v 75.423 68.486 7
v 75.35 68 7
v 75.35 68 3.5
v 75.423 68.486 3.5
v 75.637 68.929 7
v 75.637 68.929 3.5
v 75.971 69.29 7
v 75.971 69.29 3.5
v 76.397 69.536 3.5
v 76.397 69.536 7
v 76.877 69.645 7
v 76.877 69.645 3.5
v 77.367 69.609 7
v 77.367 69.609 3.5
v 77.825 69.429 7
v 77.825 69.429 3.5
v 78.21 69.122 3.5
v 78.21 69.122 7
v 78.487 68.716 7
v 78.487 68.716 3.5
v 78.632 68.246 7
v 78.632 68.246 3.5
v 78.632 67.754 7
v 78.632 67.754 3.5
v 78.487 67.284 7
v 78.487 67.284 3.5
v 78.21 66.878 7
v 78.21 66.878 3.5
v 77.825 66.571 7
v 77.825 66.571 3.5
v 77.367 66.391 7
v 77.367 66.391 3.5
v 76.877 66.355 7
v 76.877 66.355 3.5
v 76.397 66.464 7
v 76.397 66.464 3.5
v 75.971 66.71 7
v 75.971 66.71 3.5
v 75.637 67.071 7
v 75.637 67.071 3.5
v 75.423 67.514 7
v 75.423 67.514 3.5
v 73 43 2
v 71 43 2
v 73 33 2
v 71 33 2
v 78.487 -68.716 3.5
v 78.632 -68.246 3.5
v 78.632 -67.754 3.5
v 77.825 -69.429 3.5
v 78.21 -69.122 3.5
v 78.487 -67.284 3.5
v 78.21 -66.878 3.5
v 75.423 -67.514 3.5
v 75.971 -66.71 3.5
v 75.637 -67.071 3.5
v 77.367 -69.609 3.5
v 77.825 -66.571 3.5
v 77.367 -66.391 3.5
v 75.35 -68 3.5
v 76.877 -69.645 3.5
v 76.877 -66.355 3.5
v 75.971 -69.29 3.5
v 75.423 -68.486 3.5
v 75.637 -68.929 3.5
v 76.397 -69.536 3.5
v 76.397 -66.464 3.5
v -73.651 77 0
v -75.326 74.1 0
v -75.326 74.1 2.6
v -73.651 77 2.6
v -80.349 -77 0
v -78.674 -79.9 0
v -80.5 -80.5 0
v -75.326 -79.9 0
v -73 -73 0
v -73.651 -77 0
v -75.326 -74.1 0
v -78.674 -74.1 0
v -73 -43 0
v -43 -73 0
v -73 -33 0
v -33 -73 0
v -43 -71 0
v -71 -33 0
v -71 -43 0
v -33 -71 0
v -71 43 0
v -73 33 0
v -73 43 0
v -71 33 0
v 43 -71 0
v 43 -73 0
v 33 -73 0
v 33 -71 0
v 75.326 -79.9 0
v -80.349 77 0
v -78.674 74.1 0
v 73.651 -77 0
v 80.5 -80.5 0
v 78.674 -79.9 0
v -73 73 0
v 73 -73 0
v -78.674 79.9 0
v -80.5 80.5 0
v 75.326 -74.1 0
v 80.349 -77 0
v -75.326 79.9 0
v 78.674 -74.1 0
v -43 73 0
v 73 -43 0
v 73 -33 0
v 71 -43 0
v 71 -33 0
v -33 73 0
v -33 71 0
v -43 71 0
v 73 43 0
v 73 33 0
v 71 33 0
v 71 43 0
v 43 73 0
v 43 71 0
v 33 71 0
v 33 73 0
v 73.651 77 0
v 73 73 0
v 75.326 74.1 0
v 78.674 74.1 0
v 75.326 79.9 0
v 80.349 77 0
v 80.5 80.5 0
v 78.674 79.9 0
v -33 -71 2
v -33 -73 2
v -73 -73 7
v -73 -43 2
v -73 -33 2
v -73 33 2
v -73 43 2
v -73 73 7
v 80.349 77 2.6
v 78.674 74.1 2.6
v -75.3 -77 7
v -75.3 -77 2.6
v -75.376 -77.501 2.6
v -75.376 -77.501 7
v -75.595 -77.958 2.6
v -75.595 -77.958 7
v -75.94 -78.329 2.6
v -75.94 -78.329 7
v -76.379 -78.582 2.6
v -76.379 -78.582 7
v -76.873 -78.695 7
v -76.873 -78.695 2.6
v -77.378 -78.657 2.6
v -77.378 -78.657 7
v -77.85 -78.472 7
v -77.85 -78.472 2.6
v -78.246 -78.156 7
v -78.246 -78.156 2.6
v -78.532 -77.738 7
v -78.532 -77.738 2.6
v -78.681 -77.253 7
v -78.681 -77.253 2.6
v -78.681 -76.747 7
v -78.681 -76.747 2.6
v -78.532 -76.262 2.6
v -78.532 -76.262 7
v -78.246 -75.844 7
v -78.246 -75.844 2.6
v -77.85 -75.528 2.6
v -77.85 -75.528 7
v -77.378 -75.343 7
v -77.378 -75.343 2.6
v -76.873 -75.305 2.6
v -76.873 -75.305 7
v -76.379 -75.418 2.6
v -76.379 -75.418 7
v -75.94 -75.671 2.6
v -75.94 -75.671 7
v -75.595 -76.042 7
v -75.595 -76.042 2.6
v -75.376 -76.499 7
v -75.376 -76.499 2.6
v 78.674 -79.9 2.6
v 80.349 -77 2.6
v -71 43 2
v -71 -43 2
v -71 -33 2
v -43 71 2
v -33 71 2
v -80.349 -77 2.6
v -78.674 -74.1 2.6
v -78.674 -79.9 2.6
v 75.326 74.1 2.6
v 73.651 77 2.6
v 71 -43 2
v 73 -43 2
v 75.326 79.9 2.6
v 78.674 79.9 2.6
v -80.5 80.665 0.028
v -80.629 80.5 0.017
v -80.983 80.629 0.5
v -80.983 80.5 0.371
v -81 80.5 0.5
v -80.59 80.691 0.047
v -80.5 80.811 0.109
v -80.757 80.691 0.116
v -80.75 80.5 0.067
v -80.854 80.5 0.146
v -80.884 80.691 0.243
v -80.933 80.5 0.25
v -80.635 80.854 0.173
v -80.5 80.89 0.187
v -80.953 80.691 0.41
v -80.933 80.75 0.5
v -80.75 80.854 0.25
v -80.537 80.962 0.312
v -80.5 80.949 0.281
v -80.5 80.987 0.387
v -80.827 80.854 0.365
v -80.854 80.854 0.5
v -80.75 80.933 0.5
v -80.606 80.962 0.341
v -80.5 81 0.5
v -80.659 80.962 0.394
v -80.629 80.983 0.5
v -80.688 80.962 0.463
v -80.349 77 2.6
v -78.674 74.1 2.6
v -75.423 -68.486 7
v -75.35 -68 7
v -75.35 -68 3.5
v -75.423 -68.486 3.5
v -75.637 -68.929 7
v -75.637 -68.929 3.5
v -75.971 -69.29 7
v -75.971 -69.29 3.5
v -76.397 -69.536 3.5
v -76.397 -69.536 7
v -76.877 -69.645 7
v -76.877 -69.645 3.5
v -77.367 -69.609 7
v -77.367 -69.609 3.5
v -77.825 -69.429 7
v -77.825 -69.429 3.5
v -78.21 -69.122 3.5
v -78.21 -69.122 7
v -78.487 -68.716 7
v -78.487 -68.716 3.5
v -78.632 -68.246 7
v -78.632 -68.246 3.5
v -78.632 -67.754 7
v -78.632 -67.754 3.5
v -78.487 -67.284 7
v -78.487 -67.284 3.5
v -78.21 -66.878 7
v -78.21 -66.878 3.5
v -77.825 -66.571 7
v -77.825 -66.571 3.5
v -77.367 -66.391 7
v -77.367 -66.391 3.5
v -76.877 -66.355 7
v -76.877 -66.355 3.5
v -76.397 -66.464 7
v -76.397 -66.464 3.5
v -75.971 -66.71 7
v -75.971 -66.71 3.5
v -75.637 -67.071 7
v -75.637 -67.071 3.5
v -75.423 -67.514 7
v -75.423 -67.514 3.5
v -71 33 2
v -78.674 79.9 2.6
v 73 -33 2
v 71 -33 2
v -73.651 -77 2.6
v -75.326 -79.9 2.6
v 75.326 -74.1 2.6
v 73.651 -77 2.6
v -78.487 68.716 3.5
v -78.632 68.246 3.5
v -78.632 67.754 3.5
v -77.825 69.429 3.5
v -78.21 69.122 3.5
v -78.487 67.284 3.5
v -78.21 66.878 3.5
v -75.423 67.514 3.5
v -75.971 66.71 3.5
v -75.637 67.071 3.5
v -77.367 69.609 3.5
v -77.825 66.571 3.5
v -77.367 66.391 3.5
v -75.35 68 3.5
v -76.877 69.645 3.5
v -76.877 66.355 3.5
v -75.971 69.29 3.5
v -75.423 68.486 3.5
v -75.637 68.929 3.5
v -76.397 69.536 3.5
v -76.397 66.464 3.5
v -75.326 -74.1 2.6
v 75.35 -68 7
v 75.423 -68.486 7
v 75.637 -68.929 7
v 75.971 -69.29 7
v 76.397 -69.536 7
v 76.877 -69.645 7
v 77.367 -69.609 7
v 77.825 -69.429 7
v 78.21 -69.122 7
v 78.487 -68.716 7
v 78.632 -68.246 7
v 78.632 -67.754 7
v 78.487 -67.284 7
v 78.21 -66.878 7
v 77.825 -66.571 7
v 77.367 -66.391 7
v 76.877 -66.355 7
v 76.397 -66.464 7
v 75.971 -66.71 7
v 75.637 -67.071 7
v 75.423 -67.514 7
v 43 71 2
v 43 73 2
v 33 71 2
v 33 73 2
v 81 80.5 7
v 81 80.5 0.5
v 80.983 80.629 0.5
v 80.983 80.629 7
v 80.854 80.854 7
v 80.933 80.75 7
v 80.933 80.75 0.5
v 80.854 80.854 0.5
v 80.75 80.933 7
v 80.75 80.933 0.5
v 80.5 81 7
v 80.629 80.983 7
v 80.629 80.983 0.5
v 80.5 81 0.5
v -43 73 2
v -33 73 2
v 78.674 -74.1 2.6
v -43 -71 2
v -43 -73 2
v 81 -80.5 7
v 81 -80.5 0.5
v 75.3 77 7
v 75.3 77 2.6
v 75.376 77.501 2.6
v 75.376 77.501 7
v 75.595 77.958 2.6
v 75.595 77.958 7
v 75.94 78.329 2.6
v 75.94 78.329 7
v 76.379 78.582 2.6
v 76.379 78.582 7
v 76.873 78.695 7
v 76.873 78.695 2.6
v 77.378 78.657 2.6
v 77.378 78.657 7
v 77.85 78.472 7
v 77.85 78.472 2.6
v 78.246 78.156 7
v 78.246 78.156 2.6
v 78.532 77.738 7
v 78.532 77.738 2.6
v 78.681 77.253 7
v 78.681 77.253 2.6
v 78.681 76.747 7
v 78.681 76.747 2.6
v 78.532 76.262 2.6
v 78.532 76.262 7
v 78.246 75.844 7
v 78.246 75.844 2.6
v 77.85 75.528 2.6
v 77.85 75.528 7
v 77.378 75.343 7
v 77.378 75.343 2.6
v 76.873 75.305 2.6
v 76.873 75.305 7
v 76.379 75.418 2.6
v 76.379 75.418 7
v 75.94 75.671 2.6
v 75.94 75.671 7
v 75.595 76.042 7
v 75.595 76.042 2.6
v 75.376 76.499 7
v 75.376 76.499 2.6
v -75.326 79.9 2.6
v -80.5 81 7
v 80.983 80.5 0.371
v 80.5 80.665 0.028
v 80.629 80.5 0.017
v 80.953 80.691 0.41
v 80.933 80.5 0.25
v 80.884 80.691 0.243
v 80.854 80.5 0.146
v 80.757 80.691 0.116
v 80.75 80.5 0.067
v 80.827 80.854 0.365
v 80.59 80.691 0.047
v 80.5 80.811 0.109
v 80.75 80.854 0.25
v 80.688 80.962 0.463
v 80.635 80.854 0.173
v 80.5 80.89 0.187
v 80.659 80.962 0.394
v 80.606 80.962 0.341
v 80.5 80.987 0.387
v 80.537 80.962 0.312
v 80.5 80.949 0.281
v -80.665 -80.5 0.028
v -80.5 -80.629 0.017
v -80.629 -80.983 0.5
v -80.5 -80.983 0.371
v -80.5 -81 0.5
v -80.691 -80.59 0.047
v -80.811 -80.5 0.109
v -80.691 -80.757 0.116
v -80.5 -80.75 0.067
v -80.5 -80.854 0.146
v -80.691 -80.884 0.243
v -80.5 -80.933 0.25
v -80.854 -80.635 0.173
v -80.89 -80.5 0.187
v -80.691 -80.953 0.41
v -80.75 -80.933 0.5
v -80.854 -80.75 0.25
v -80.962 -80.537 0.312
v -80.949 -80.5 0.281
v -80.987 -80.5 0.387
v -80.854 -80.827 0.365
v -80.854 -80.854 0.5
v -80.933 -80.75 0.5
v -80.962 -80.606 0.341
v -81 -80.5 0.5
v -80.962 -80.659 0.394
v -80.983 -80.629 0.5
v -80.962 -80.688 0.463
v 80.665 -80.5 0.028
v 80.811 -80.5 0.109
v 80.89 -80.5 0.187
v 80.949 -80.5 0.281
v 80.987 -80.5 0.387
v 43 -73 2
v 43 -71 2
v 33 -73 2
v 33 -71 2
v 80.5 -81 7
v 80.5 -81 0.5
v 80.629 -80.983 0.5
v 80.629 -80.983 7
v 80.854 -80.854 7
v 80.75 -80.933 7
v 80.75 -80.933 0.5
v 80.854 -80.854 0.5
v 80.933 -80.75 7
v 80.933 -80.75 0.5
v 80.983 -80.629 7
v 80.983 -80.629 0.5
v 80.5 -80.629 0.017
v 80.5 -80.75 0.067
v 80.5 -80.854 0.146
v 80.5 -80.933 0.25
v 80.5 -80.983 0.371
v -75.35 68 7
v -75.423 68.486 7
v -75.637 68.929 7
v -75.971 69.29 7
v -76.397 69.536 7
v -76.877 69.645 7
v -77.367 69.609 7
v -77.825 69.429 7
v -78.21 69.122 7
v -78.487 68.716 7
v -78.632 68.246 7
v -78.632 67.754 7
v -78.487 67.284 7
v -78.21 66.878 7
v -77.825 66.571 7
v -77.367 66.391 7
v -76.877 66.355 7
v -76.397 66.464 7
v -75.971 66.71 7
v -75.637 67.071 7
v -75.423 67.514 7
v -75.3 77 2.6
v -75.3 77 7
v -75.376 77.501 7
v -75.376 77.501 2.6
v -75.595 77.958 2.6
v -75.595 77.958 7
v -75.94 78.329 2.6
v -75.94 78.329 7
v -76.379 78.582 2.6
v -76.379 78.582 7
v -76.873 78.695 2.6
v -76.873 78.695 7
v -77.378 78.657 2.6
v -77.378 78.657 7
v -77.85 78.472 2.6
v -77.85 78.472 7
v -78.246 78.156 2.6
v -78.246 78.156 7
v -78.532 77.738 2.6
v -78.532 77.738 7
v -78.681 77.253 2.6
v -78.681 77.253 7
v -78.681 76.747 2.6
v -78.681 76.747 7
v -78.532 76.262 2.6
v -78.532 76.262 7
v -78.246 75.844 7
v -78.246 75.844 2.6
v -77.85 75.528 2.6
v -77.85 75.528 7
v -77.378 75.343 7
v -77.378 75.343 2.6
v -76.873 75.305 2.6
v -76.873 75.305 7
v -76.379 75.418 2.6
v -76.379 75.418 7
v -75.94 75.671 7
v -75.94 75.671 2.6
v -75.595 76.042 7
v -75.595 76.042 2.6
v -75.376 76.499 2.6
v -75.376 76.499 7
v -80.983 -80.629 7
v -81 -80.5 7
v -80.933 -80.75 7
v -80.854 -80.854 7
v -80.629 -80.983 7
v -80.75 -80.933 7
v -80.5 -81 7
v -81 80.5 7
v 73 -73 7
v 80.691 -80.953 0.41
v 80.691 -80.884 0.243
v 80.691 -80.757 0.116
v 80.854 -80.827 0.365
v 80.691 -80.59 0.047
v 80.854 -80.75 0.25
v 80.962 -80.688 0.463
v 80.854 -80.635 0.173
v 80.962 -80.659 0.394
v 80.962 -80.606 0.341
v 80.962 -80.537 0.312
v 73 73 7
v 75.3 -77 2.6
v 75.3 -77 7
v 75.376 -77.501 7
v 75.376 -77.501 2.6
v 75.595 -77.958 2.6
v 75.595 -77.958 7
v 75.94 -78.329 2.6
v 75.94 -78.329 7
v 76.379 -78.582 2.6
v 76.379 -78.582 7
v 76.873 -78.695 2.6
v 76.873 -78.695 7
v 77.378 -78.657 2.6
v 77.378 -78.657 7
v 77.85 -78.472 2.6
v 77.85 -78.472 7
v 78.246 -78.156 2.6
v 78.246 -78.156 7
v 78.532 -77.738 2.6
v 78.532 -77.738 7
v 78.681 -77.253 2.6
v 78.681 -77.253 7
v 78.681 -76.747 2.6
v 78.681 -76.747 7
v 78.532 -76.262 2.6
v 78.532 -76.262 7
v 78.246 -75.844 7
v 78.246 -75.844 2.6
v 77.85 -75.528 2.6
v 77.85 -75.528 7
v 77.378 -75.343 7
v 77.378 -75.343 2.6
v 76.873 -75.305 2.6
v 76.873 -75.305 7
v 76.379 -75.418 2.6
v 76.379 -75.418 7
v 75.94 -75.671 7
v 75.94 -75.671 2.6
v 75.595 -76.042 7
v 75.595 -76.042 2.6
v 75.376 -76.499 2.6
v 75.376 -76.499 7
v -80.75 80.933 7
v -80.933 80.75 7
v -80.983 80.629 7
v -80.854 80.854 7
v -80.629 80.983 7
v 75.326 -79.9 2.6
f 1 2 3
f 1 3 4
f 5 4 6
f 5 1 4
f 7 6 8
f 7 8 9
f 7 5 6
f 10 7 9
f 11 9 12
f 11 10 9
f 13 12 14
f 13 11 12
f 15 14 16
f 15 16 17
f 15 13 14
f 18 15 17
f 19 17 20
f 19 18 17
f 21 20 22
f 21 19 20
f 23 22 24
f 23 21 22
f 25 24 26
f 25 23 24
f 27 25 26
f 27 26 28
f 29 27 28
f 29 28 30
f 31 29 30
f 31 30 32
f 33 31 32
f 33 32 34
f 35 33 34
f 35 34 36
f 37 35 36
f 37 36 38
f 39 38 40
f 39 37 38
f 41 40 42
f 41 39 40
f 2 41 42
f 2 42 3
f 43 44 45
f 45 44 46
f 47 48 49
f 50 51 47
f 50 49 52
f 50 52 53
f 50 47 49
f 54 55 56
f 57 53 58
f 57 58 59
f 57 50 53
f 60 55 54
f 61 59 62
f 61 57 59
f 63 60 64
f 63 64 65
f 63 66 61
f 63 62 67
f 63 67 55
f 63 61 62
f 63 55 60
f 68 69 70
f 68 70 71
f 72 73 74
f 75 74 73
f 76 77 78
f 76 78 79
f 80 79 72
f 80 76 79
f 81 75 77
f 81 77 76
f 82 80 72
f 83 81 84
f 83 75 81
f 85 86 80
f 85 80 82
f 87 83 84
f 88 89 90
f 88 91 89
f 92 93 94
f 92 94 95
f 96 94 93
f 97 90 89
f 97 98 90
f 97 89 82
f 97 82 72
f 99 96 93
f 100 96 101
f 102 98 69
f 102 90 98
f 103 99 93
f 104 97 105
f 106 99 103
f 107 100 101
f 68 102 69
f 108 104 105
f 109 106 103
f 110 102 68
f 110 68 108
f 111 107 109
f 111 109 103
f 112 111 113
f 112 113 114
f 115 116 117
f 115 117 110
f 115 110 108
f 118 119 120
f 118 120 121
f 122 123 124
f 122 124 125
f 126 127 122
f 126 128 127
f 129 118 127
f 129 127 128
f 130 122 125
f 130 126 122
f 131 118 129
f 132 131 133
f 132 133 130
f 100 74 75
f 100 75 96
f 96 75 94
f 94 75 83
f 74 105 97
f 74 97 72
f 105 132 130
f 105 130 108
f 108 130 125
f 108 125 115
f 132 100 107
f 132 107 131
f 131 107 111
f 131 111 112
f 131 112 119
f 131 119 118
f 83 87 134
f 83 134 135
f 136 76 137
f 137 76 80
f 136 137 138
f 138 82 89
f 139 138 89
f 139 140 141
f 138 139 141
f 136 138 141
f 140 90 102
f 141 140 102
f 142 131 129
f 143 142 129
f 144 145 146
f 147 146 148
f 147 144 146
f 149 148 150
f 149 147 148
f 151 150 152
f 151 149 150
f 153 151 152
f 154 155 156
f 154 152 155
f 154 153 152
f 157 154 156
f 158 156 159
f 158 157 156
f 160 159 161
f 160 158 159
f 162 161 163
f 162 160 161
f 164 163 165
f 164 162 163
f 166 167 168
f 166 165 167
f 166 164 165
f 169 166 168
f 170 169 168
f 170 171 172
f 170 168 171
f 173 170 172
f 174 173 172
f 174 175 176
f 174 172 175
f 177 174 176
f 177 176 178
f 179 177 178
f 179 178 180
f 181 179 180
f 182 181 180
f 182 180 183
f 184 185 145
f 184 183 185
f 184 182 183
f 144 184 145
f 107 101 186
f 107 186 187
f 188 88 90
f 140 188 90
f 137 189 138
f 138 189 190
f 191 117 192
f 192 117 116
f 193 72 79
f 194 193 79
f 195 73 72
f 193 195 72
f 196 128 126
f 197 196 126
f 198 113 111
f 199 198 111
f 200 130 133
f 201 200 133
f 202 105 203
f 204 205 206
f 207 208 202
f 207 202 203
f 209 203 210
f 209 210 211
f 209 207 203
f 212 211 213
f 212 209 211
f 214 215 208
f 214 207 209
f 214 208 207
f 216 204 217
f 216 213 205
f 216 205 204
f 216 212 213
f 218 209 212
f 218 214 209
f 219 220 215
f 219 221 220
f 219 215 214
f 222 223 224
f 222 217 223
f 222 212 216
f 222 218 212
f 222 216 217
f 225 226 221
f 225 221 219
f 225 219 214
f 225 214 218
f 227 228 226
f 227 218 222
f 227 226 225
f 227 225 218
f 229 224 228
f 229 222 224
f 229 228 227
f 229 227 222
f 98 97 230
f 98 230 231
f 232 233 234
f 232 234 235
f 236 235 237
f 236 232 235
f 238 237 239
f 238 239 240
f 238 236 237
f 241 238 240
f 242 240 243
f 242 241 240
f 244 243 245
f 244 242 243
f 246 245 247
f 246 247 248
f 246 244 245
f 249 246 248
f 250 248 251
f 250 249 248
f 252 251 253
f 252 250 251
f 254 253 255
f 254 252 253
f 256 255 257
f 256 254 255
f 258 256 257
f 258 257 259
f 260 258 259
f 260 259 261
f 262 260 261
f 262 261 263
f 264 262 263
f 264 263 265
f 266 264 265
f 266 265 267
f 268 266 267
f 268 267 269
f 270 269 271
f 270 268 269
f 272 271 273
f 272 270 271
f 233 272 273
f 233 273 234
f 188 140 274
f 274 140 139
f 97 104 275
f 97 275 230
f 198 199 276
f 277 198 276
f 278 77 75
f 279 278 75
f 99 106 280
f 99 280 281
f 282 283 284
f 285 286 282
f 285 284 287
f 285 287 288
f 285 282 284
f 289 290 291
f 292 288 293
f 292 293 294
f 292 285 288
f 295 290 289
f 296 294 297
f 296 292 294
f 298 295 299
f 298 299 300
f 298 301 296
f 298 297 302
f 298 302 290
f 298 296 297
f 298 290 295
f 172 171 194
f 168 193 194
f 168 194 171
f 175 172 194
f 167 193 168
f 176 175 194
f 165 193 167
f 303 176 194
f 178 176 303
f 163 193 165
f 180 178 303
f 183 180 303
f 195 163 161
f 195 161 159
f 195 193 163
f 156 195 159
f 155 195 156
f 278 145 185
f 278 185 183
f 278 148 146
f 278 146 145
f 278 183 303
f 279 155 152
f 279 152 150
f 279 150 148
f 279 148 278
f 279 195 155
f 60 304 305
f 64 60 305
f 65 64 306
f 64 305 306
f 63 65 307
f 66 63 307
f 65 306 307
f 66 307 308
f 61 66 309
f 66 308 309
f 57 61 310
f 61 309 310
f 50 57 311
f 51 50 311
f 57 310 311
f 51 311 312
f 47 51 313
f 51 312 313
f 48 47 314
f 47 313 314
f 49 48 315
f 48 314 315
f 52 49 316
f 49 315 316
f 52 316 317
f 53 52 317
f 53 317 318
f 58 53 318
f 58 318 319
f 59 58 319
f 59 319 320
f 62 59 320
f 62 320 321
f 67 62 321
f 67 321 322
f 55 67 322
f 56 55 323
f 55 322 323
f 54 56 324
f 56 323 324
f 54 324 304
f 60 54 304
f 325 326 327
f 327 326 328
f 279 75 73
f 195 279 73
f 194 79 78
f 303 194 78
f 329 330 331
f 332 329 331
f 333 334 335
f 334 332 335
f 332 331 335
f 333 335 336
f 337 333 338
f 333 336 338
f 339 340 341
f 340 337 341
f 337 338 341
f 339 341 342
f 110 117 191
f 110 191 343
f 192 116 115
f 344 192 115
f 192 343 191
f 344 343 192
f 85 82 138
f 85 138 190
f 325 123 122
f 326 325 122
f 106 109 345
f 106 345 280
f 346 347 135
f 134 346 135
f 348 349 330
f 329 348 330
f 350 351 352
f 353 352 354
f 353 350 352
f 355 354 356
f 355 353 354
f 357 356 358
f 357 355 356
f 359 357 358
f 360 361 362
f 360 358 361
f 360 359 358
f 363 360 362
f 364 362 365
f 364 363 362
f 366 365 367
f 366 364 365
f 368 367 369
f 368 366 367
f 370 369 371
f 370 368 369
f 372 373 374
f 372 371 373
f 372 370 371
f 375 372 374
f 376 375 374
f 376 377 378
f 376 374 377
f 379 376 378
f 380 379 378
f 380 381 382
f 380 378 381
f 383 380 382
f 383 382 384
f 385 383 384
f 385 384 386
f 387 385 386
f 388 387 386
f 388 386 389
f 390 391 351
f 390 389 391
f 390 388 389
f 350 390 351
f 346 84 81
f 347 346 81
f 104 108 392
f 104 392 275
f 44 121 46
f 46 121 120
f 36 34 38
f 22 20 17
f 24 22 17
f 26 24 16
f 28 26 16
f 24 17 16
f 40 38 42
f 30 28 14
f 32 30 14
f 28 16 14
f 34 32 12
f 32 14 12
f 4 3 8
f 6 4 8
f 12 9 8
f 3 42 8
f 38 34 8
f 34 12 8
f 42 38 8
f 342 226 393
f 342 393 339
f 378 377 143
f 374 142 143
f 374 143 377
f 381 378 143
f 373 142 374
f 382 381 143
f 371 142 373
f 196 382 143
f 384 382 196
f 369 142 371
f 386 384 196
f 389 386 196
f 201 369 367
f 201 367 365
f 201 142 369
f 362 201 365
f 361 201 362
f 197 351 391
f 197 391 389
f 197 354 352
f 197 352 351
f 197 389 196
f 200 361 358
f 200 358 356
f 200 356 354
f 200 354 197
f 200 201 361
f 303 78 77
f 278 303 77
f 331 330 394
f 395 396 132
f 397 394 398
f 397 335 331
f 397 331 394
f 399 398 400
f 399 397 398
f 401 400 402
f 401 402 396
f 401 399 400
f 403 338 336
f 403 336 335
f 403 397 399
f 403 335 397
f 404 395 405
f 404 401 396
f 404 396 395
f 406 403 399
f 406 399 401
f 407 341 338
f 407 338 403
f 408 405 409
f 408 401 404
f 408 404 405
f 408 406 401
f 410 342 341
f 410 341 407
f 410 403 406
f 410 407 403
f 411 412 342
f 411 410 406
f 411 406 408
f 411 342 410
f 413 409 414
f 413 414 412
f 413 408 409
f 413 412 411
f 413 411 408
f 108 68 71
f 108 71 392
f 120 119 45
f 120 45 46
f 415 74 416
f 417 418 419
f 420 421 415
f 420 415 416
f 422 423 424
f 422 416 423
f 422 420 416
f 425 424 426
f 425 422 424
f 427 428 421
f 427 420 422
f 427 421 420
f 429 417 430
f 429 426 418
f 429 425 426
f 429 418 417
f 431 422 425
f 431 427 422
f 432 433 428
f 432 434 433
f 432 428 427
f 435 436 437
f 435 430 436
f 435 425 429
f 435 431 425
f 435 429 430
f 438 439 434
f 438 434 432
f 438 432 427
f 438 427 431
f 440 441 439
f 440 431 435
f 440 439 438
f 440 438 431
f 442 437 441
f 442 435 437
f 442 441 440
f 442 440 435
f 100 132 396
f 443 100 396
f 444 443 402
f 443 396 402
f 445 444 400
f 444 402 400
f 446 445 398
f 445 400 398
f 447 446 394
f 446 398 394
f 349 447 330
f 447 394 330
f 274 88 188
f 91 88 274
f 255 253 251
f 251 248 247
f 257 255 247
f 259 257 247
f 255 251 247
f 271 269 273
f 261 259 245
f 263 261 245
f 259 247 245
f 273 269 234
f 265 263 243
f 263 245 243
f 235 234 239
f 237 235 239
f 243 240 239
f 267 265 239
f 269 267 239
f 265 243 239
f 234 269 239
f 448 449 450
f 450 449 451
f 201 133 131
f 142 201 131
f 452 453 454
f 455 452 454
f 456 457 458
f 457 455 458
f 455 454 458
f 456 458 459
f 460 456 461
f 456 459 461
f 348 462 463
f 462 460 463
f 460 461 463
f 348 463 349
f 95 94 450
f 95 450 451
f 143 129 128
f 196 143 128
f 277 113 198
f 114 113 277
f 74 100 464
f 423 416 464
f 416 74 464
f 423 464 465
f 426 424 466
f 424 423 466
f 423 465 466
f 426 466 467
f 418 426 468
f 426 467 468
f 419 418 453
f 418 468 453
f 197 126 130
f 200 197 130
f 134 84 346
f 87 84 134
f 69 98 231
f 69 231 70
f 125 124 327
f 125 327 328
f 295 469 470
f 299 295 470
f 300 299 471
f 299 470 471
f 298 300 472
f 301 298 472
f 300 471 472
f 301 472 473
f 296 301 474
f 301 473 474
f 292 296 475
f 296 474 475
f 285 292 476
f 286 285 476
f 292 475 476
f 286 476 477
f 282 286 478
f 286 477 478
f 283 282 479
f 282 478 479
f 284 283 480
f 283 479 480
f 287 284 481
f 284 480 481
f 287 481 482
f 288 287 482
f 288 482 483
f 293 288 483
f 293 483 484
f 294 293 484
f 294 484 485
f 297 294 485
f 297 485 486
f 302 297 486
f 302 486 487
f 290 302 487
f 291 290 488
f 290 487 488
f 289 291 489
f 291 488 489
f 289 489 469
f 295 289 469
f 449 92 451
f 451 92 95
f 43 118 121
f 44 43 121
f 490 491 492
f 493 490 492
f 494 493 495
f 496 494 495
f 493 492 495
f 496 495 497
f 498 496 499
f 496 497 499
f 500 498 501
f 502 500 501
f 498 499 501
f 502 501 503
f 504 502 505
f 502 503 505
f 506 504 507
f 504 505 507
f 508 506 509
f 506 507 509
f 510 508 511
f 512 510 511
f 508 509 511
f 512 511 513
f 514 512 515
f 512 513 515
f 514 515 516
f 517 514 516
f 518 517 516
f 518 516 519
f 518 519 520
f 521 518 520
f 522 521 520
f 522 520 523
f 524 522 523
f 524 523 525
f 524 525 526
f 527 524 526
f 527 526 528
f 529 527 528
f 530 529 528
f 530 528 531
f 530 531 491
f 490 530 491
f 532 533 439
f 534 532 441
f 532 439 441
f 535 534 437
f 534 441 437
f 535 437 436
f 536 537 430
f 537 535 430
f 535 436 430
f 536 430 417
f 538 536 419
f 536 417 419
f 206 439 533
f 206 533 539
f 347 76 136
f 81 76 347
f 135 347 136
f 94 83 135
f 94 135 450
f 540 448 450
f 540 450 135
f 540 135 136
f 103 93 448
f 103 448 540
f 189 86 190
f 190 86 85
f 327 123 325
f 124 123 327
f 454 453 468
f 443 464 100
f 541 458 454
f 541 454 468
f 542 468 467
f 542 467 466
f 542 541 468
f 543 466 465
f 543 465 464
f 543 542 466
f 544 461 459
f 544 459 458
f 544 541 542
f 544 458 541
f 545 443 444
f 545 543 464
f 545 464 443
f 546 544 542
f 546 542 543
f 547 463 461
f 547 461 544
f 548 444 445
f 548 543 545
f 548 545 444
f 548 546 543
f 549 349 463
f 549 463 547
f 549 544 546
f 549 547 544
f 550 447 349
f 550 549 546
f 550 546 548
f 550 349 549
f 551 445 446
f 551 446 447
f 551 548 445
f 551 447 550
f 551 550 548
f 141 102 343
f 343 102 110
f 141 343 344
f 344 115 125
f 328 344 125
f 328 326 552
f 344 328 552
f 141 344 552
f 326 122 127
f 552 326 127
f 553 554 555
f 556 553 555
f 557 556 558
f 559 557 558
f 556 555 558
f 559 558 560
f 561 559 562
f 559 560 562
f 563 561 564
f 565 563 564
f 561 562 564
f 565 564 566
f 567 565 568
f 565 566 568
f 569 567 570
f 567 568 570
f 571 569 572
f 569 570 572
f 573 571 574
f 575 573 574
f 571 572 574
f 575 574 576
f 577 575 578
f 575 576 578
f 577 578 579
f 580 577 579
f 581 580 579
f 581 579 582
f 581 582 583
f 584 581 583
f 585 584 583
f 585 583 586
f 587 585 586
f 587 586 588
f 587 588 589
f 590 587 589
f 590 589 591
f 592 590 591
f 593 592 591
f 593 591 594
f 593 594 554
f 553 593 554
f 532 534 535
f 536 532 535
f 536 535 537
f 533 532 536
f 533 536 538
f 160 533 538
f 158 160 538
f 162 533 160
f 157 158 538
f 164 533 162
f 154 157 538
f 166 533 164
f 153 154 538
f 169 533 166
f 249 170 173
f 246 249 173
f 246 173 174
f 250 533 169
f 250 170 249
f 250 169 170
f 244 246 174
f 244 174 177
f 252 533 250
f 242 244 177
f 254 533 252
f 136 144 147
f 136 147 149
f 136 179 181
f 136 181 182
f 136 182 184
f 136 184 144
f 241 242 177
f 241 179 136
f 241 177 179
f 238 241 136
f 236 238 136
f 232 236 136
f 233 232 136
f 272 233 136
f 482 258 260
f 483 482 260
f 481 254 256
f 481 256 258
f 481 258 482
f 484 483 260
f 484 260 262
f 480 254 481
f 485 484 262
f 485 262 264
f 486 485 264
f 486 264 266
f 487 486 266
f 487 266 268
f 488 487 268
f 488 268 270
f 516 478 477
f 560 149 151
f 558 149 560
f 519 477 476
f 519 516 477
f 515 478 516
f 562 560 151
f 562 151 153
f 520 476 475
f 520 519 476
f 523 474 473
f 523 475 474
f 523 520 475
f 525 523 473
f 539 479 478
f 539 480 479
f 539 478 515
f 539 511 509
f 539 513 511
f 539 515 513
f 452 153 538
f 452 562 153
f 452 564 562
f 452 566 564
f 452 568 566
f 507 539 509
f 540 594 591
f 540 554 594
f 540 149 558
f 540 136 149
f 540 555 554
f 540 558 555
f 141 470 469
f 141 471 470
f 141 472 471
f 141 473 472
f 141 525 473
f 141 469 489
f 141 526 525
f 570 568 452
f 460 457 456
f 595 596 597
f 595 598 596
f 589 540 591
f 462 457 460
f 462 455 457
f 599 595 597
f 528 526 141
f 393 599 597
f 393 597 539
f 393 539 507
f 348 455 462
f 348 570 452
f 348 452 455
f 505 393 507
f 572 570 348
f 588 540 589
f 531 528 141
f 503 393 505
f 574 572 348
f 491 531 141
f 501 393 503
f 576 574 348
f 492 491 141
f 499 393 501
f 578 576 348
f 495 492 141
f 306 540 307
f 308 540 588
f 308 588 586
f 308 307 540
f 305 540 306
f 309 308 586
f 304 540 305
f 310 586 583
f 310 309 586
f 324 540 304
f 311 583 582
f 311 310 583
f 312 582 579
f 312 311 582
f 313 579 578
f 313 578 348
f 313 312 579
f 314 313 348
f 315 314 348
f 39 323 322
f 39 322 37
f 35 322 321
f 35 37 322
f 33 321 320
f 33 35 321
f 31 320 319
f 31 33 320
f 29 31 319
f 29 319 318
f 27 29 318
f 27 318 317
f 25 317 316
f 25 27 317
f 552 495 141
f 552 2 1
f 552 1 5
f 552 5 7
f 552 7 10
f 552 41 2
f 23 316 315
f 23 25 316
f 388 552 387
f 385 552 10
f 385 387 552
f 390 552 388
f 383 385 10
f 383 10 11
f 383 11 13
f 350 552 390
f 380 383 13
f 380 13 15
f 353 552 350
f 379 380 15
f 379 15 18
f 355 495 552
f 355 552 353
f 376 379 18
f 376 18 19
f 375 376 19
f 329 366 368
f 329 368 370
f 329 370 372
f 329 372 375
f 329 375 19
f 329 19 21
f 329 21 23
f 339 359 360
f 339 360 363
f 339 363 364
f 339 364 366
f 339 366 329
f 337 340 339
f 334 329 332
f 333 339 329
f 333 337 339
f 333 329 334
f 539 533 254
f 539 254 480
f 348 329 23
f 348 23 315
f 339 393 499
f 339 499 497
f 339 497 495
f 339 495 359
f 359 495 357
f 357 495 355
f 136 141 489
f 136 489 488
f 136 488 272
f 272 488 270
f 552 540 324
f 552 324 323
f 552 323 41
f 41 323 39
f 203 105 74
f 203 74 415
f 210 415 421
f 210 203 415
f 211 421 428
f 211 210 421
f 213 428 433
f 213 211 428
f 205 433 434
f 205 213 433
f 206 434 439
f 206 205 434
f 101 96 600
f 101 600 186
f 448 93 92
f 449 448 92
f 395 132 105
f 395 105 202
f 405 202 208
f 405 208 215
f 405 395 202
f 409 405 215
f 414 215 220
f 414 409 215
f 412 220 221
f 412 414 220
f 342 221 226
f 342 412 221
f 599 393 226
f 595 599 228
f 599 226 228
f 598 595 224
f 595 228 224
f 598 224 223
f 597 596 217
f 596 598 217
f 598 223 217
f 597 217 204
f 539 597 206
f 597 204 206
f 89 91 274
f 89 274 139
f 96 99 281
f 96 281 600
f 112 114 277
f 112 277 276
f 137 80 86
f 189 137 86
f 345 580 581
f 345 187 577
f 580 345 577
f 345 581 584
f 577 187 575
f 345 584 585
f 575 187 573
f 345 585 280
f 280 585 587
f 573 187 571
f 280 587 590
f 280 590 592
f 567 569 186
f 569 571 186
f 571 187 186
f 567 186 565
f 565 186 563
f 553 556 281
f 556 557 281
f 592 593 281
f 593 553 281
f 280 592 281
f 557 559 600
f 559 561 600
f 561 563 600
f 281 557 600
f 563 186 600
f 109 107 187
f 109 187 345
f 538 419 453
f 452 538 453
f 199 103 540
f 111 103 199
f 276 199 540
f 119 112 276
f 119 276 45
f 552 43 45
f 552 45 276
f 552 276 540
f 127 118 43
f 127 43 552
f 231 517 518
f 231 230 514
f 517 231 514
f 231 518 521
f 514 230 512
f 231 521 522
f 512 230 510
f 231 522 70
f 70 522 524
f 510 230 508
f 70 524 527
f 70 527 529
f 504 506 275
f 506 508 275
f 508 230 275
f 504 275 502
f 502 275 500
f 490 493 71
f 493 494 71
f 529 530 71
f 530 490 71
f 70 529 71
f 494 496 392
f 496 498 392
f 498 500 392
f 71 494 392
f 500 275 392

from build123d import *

# Parameters (mm, degrees)
SKETCH_1_W                                   = 162
SKETCH_1_H                                   = 162
SKETCH_1_W_2                                 = 146
SKETCH_1_H_2                                 = 146
EXTRUDE_375_DEPTH                            = 7
SKETCH_2_W                                   = 10
SKETCH_2_H                                   = 3
EXTRUDE_670_DEPTH                            = 2
PATTERN_CIRCULAR_761_COUNT                   = 4
PATTERN_CIRCULAR_761_COPY_1_SKETCH_W         = 10
PATTERN_CIRCULAR_761_COPY_1_SKETCH_H         = 3
PATTERN_CIRCULAR_761_COPY_1_DEPTH            = 2
PATTERN_CIRCULAR_761_COPY_2_SKETCH_W         = 10
PATTERN_CIRCULAR_761_COPY_2_SKETCH_H         = 3
PATTERN_CIRCULAR_761_COPY_2_DEPTH            = 2
PATTERN_CIRCULAR_761_COPY_3_SKETCH_W         = 10
PATTERN_CIRCULAR_761_COPY_3_SKETCH_H         = 3
PATTERN_CIRCULAR_761_COPY_3_DEPTH            = 2
SKETCH_3_R                                   = 1.7
CUT_EXTRUDE_1047_DEPTH                       = 115.764977236
MIRROR_1214_COPY_1_SKETCH_R                  = 1.7
MIRROR_1214_COPY_1_DEPTH                     = 115.764977236
SKETCH_4_R                                   = 1.65
CUT_EXTRUDE_1505_DEPTH                       = 3.5
MIRROR_1637_COPY_1_SKETCH_R                  = 1.65
MIRROR_1637_COPY_1_DEPTH                     = 3.5
CUT_EXTRUDE_2611_DEPTH                       = 2.6
MIRROR_2701_AT_THE_SECOND_PLANE_COPY_1_DEPTH = 2.6
FILLET_1_R                                   = 0.5
FILLET_2_R                                   = 0.5


with BuildPart() as part:
    # Эскиз1 → Extrude 375 (new body)
    with BuildSketch(Plane.XY):
        Rectangle(SKETCH_1_W, SKETCH_1_H)
        Rectangle(SKETCH_1_W_2, SKETCH_1_H_2, mode=Mode.SUBTRACT)
    extrude(amount=EXTRUDE_375_DEPTH)

    # Эскиз2 → Extrude 670 (add)
    with BuildSketch(Plane(origin=(0, 0, 0), x_dir=(-1, 0, 0), z_dir=(0, 0, -1))):
        with Locations((-38, 72.5)):
            Rectangle(SKETCH_2_W, SKETCH_2_H)
    extrude_670 = extrude(amount=-EXTRUDE_670_DEPTH)

    # Mirror 726: Extrude 670 across plane
    add(extrude_670.mirror(Plane(origin=(0, 0, 0), x_dir=(0, 0, 1), z_dir=(1, 0, 0))))

    # Pattern Circular 761: Extrude 670 ×4 about axis
    pattern_circular_761_axis = Axis((0, 0, 0), (0, 0, 1))
    for i in range(1, PATTERN_CIRCULAR_761_COUNT):
        add(extrude_670.rotate(pattern_circular_761_axis, i * 360 / PATTERN_CIRCULAR_761_COUNT))

    # Pattern Circular 761 copy 1 sketch → Pattern Circular 761 copy 1 (add)
    with BuildSketch(Plane.YX):
        with Locations((-38, -72.5)):
            Rectangle(PATTERN_CIRCULAR_761_COPY_1_SKETCH_W, PATTERN_CIRCULAR_761_COPY_1_SKETCH_H)
    extrude(amount=-PATTERN_CIRCULAR_761_COPY_1_DEPTH)

    # Pattern Circular 761 copy 2 sketch → Pattern Circular 761 copy 2 (add)
    with BuildSketch(Plane(origin=(0, 0, 0), x_dir=(-1, 0, 0), z_dir=(0, 0, -1))):
        with Locations((-38, -72.5)):
            Rectangle(PATTERN_CIRCULAR_761_COPY_2_SKETCH_W, PATTERN_CIRCULAR_761_COPY_2_SKETCH_H)
    extrude(amount=-PATTERN_CIRCULAR_761_COPY_2_DEPTH)

    # Pattern Circular 761 copy 3 sketch → Pattern Circular 761 copy 3 (add)
    with BuildSketch(Plane(origin=(0, 0, 0), x_dir=(0, -1, 0), z_dir=(0, 0, -1))):
        with Locations((-38, -72.5)):
            Rectangle(PATTERN_CIRCULAR_761_COPY_3_SKETCH_W, PATTERN_CIRCULAR_761_COPY_3_SKETCH_H)
    extrude(amount=-PATTERN_CIRCULAR_761_COPY_3_DEPTH)

    # Эскиз3 → Cut-Extrude 1047 (cut, through all)
    with BuildSketch(Plane.XY.offset(7)):
        with Locations((-77, 77)):
            Circle(SKETCH_3_R)
    cut_extrude_1047 = extrude(amount=-CUT_EXTRUDE_1047_DEPTH, mode=Mode.SUBTRACT)

    # Mirror 1158: Cut-Extrude 1047 across plane
    add(cut_extrude_1047.mirror(Plane(origin=(0, 0, 0), x_dir=(0, 0, 1), z_dir=(1, 0, 0))), mode=Mode.SUBTRACT)

    # Mirror 1214: Cut-Extrude 1047 across plane
    add(cut_extrude_1047.mirror(Plane.ZX), mode=Mode.SUBTRACT)

    # Mirror 1214 copy 1 sketch → Mirror 1214 copy 1 (cut, through all)
    with BuildSketch(Plane(origin=(0, 0, 7), x_dir=(-1, 0, 0), z_dir=(0, 0, 1))):
        with Locations((-77, 77)):
            Circle(MIRROR_1214_COPY_1_SKETCH_R)
    extrude(amount=-MIRROR_1214_COPY_1_DEPTH, mode=Mode.SUBTRACT)

    # Эскиз4 → Cut-Extrude 1505 (cut)
    with BuildSketch(Plane.XY.offset(7)):
        with Locations((-77, 68)):
            Circle(SKETCH_4_R)
    cut_extrude_1505 = extrude(amount=-CUT_EXTRUDE_1505_DEPTH, mode=Mode.SUBTRACT)

    # Mirror 1581: Cut-Extrude 1505 across plane
    add(cut_extrude_1505.mirror(Plane(origin=(0, 0, 0), x_dir=(0, 0, 1), z_dir=(1, 0, 0))), mode=Mode.SUBTRACT)

    # Mirror 1637: Cut-Extrude 1505 across plane
    add(cut_extrude_1505.mirror(Plane.ZX), mode=Mode.SUBTRACT)

    # Mirror 1637 copy 1 sketch → Mirror 1637 copy 1 (cut)
    with BuildSketch(Plane(origin=(0, 0, 7), x_dir=(-1, 0, 0), z_dir=(0, 0, 1))):
        with Locations((-77, 68)):
            Circle(MIRROR_1637_COPY_1_SKETCH_R)
    extrude(amount=-MIRROR_1637_COPY_1_DEPTH, mode=Mode.SUBTRACT)

    # Эскиз5 → Cut-Extrude 2611 (cut)
    with BuildSketch(Plane(origin=(0, 0, 0), x_dir=(-1, 0, 0), z_dir=(0, 0, -1))):
        Polygon((-73.651368439, 77), (-75.325684219, 79.9), (-78.674315781, 79.9), (-80.348631561, 77), (-78.674315781, 74.1), (-75.325684219, 74.1), align=None)
    cut_extrude_2611 = extrude(amount=-CUT_EXTRUDE_2611_DEPTH, mode=Mode.SUBTRACT)

    # Mirror 2701: Cut-Extrude 2611 across plane
    add(cut_extrude_2611.mirror(Plane(origin=(0, 0, 0), x_dir=(0, 0, 1), z_dir=(1, 0, 0))), mode=Mode.SUBTRACT)

    # Mirror 2701 at the second plane: Cut-Extrude 2611 across plane
    add(cut_extrude_2611.mirror(Plane.ZX), mode=Mode.SUBTRACT)

    # Mirror 2701 at the second plane copy 1 s → Mirror 2701 at the second plane copy 1 (cut)
    with BuildSketch(Plane(origin=(0, 0, 0), x_dir=(1, 0, 0), z_dir=(0, 0, -1))):
        Polygon((-73.651368439, 77), (-75.325684219, 79.9), (-78.674315781, 79.9), (-80.348631561, 77), (-78.674315781, 74.1), (-75.325684219, 74.1), align=None)
    extrude(amount=-MIRROR_2701_AT_THE_SECOND_PLANE_COPY_1_DEPTH, mode=Mode.SUBTRACT)

    # Скругление1
    fillet_1_edges = [part.edges().sort_by_distance(p)[0] for p in [
        (0, -81, 0),
        (-81, 0, 0),
        (0, 81, 0),
        (81, 0, 0),
    ]]
    fillet(fillet_1_edges, radius=FILLET_1_R)

    # Скругление2
    # the kernel refuses this fillet: 0.5 mm, written as the material it takes off along each edge
    with BuildSketch(Plane(origin=(-80.5, 80.5, 0.5), x_dir=(-1, 0, 0), z_dir=(0, 1, 0))) as fillet_2_piece_1_section:
        Polygon((0, 0), (FILLET_2_R, 0), (FILLET_2_R, -FILLET_2_R), (0, -FILLET_2_R), align=None)
    fillet_2_piece_1 = extrude(amount=FILLET_2_R, mode=Mode.PRIVATE)
    fillet_2_piece_1 = fillet_2_piece_1 - Plane(origin=(-80.5, 80.5, 0.5), x_dir=(0.7071067811865475, 0, 0.7071067811865475), z_dir=(0, 1, 0)) * Sphere(FILLET_2_R, mode=Mode.PRIVATE)
    add(fillet_2_piece_1, mode=Mode.SUBTRACT)
    with BuildSketch(Plane(origin=(80.5, 80.5, 0.5), x_dir=(1, 0, 0), z_dir=(0, 1, 0))) as fillet_2_piece_2_section:
        Polygon((0, 0), (FILLET_2_R, 0), (FILLET_2_R, FILLET_2_R), (0, FILLET_2_R), align=None)
    fillet_2_piece_2 = extrude(amount=FILLET_2_R, mode=Mode.PRIVATE)
    fillet_2_piece_2 = fillet_2_piece_2 - Plane(origin=(80.5, 80.5, 0.5), x_dir=(-0.7071067811865475, 0, 0.7071067811865475), z_dir=(0, 1, 0)) * Sphere(FILLET_2_R, mode=Mode.PRIVATE)
    add(fillet_2_piece_2, mode=Mode.SUBTRACT)
    with BuildSketch(Plane(origin=(-80.5, -80.5, 0.5), x_dir=(0, -1, 0), z_dir=(-1, 0, 0))) as fillet_2_piece_3_section:
        Polygon((0, 0), (FILLET_2_R, 0), (FILLET_2_R, -FILLET_2_R), (0, -FILLET_2_R), align=None)
    fillet_2_piece_3 = extrude(amount=FILLET_2_R, mode=Mode.PRIVATE)
    fillet_2_piece_3 = fillet_2_piece_3 - Plane(origin=(-80.5, -80.5, 0.5), x_dir=(0, 0.7071067811865475, 0.7071067811865475), z_dir=(-1, 0, 0)) * Sphere(FILLET_2_R, mode=Mode.PRIVATE)
    add(fillet_2_piece_3, mode=Mode.SUBTRACT)
    with BuildSketch(Plane(origin=(80.5, -80.5, 0.5), x_dir=(0, -1, 0), z_dir=(1, 0, 0))) as fillet_2_piece_4_section:
        Polygon((0, 0), (FILLET_2_R, 0), (FILLET_2_R, FILLET_2_R), (0, FILLET_2_R), align=None)
    fillet_2_piece_4 = extrude(amount=FILLET_2_R, mode=Mode.PRIVATE)
    fillet_2_piece_4 = fillet_2_piece_4 - Plane(origin=(80.5, -80.5, 0.5), x_dir=(0, 0.7071067811865475, 0.7071067811865475), z_dir=(1, 0, 0)) * Sphere(FILLET_2_R, mode=Mode.PRIVATE)
    add(fillet_2_piece_4, mode=Mode.SUBTRACT)
    with BuildSketch(Plane(origin=(81, -81, 0.5), x_dir=(0, 1, 0), z_dir=(0, 0, 1)), Plane(origin=(81, 81, 0.5), x_dir=(-1, 0, 0), z_dir=(0, 0, 1))) as fillet_2_piece_5:
        with BuildLine():
            CenterArc((FILLET_2_R, FILLET_2_R), FILLET_2_R, 180, 90)
            Line((0, FILLET_2_R), (0, 0))
            Line((0, 0), (FILLET_2_R, 0))
        make_face()
    extrude(amount=7.75, mode=Mode.SUBTRACT)
    with BuildSketch(Plane(origin=(-81, -81, 0.5), x_dir=(0, 1, 0), z_dir=(0, 0, 1)), Plane(origin=(-81, 81, 0.5), x_dir=(1, 0, 0), z_dir=(0, 0, 1))) as fillet_2_piece_6:
        with BuildLine():
            CenterArc((FILLET_2_R, -FILLET_2_R), FILLET_2_R, 90, 90)
            Line((0, -FILLET_2_R), (0, 0))
            Line((0, 0), (FILLET_2_R, 0))
        make_face()
    extrude(amount=7.75, mode=Mode.SUBTRACT)


solid = part.part
